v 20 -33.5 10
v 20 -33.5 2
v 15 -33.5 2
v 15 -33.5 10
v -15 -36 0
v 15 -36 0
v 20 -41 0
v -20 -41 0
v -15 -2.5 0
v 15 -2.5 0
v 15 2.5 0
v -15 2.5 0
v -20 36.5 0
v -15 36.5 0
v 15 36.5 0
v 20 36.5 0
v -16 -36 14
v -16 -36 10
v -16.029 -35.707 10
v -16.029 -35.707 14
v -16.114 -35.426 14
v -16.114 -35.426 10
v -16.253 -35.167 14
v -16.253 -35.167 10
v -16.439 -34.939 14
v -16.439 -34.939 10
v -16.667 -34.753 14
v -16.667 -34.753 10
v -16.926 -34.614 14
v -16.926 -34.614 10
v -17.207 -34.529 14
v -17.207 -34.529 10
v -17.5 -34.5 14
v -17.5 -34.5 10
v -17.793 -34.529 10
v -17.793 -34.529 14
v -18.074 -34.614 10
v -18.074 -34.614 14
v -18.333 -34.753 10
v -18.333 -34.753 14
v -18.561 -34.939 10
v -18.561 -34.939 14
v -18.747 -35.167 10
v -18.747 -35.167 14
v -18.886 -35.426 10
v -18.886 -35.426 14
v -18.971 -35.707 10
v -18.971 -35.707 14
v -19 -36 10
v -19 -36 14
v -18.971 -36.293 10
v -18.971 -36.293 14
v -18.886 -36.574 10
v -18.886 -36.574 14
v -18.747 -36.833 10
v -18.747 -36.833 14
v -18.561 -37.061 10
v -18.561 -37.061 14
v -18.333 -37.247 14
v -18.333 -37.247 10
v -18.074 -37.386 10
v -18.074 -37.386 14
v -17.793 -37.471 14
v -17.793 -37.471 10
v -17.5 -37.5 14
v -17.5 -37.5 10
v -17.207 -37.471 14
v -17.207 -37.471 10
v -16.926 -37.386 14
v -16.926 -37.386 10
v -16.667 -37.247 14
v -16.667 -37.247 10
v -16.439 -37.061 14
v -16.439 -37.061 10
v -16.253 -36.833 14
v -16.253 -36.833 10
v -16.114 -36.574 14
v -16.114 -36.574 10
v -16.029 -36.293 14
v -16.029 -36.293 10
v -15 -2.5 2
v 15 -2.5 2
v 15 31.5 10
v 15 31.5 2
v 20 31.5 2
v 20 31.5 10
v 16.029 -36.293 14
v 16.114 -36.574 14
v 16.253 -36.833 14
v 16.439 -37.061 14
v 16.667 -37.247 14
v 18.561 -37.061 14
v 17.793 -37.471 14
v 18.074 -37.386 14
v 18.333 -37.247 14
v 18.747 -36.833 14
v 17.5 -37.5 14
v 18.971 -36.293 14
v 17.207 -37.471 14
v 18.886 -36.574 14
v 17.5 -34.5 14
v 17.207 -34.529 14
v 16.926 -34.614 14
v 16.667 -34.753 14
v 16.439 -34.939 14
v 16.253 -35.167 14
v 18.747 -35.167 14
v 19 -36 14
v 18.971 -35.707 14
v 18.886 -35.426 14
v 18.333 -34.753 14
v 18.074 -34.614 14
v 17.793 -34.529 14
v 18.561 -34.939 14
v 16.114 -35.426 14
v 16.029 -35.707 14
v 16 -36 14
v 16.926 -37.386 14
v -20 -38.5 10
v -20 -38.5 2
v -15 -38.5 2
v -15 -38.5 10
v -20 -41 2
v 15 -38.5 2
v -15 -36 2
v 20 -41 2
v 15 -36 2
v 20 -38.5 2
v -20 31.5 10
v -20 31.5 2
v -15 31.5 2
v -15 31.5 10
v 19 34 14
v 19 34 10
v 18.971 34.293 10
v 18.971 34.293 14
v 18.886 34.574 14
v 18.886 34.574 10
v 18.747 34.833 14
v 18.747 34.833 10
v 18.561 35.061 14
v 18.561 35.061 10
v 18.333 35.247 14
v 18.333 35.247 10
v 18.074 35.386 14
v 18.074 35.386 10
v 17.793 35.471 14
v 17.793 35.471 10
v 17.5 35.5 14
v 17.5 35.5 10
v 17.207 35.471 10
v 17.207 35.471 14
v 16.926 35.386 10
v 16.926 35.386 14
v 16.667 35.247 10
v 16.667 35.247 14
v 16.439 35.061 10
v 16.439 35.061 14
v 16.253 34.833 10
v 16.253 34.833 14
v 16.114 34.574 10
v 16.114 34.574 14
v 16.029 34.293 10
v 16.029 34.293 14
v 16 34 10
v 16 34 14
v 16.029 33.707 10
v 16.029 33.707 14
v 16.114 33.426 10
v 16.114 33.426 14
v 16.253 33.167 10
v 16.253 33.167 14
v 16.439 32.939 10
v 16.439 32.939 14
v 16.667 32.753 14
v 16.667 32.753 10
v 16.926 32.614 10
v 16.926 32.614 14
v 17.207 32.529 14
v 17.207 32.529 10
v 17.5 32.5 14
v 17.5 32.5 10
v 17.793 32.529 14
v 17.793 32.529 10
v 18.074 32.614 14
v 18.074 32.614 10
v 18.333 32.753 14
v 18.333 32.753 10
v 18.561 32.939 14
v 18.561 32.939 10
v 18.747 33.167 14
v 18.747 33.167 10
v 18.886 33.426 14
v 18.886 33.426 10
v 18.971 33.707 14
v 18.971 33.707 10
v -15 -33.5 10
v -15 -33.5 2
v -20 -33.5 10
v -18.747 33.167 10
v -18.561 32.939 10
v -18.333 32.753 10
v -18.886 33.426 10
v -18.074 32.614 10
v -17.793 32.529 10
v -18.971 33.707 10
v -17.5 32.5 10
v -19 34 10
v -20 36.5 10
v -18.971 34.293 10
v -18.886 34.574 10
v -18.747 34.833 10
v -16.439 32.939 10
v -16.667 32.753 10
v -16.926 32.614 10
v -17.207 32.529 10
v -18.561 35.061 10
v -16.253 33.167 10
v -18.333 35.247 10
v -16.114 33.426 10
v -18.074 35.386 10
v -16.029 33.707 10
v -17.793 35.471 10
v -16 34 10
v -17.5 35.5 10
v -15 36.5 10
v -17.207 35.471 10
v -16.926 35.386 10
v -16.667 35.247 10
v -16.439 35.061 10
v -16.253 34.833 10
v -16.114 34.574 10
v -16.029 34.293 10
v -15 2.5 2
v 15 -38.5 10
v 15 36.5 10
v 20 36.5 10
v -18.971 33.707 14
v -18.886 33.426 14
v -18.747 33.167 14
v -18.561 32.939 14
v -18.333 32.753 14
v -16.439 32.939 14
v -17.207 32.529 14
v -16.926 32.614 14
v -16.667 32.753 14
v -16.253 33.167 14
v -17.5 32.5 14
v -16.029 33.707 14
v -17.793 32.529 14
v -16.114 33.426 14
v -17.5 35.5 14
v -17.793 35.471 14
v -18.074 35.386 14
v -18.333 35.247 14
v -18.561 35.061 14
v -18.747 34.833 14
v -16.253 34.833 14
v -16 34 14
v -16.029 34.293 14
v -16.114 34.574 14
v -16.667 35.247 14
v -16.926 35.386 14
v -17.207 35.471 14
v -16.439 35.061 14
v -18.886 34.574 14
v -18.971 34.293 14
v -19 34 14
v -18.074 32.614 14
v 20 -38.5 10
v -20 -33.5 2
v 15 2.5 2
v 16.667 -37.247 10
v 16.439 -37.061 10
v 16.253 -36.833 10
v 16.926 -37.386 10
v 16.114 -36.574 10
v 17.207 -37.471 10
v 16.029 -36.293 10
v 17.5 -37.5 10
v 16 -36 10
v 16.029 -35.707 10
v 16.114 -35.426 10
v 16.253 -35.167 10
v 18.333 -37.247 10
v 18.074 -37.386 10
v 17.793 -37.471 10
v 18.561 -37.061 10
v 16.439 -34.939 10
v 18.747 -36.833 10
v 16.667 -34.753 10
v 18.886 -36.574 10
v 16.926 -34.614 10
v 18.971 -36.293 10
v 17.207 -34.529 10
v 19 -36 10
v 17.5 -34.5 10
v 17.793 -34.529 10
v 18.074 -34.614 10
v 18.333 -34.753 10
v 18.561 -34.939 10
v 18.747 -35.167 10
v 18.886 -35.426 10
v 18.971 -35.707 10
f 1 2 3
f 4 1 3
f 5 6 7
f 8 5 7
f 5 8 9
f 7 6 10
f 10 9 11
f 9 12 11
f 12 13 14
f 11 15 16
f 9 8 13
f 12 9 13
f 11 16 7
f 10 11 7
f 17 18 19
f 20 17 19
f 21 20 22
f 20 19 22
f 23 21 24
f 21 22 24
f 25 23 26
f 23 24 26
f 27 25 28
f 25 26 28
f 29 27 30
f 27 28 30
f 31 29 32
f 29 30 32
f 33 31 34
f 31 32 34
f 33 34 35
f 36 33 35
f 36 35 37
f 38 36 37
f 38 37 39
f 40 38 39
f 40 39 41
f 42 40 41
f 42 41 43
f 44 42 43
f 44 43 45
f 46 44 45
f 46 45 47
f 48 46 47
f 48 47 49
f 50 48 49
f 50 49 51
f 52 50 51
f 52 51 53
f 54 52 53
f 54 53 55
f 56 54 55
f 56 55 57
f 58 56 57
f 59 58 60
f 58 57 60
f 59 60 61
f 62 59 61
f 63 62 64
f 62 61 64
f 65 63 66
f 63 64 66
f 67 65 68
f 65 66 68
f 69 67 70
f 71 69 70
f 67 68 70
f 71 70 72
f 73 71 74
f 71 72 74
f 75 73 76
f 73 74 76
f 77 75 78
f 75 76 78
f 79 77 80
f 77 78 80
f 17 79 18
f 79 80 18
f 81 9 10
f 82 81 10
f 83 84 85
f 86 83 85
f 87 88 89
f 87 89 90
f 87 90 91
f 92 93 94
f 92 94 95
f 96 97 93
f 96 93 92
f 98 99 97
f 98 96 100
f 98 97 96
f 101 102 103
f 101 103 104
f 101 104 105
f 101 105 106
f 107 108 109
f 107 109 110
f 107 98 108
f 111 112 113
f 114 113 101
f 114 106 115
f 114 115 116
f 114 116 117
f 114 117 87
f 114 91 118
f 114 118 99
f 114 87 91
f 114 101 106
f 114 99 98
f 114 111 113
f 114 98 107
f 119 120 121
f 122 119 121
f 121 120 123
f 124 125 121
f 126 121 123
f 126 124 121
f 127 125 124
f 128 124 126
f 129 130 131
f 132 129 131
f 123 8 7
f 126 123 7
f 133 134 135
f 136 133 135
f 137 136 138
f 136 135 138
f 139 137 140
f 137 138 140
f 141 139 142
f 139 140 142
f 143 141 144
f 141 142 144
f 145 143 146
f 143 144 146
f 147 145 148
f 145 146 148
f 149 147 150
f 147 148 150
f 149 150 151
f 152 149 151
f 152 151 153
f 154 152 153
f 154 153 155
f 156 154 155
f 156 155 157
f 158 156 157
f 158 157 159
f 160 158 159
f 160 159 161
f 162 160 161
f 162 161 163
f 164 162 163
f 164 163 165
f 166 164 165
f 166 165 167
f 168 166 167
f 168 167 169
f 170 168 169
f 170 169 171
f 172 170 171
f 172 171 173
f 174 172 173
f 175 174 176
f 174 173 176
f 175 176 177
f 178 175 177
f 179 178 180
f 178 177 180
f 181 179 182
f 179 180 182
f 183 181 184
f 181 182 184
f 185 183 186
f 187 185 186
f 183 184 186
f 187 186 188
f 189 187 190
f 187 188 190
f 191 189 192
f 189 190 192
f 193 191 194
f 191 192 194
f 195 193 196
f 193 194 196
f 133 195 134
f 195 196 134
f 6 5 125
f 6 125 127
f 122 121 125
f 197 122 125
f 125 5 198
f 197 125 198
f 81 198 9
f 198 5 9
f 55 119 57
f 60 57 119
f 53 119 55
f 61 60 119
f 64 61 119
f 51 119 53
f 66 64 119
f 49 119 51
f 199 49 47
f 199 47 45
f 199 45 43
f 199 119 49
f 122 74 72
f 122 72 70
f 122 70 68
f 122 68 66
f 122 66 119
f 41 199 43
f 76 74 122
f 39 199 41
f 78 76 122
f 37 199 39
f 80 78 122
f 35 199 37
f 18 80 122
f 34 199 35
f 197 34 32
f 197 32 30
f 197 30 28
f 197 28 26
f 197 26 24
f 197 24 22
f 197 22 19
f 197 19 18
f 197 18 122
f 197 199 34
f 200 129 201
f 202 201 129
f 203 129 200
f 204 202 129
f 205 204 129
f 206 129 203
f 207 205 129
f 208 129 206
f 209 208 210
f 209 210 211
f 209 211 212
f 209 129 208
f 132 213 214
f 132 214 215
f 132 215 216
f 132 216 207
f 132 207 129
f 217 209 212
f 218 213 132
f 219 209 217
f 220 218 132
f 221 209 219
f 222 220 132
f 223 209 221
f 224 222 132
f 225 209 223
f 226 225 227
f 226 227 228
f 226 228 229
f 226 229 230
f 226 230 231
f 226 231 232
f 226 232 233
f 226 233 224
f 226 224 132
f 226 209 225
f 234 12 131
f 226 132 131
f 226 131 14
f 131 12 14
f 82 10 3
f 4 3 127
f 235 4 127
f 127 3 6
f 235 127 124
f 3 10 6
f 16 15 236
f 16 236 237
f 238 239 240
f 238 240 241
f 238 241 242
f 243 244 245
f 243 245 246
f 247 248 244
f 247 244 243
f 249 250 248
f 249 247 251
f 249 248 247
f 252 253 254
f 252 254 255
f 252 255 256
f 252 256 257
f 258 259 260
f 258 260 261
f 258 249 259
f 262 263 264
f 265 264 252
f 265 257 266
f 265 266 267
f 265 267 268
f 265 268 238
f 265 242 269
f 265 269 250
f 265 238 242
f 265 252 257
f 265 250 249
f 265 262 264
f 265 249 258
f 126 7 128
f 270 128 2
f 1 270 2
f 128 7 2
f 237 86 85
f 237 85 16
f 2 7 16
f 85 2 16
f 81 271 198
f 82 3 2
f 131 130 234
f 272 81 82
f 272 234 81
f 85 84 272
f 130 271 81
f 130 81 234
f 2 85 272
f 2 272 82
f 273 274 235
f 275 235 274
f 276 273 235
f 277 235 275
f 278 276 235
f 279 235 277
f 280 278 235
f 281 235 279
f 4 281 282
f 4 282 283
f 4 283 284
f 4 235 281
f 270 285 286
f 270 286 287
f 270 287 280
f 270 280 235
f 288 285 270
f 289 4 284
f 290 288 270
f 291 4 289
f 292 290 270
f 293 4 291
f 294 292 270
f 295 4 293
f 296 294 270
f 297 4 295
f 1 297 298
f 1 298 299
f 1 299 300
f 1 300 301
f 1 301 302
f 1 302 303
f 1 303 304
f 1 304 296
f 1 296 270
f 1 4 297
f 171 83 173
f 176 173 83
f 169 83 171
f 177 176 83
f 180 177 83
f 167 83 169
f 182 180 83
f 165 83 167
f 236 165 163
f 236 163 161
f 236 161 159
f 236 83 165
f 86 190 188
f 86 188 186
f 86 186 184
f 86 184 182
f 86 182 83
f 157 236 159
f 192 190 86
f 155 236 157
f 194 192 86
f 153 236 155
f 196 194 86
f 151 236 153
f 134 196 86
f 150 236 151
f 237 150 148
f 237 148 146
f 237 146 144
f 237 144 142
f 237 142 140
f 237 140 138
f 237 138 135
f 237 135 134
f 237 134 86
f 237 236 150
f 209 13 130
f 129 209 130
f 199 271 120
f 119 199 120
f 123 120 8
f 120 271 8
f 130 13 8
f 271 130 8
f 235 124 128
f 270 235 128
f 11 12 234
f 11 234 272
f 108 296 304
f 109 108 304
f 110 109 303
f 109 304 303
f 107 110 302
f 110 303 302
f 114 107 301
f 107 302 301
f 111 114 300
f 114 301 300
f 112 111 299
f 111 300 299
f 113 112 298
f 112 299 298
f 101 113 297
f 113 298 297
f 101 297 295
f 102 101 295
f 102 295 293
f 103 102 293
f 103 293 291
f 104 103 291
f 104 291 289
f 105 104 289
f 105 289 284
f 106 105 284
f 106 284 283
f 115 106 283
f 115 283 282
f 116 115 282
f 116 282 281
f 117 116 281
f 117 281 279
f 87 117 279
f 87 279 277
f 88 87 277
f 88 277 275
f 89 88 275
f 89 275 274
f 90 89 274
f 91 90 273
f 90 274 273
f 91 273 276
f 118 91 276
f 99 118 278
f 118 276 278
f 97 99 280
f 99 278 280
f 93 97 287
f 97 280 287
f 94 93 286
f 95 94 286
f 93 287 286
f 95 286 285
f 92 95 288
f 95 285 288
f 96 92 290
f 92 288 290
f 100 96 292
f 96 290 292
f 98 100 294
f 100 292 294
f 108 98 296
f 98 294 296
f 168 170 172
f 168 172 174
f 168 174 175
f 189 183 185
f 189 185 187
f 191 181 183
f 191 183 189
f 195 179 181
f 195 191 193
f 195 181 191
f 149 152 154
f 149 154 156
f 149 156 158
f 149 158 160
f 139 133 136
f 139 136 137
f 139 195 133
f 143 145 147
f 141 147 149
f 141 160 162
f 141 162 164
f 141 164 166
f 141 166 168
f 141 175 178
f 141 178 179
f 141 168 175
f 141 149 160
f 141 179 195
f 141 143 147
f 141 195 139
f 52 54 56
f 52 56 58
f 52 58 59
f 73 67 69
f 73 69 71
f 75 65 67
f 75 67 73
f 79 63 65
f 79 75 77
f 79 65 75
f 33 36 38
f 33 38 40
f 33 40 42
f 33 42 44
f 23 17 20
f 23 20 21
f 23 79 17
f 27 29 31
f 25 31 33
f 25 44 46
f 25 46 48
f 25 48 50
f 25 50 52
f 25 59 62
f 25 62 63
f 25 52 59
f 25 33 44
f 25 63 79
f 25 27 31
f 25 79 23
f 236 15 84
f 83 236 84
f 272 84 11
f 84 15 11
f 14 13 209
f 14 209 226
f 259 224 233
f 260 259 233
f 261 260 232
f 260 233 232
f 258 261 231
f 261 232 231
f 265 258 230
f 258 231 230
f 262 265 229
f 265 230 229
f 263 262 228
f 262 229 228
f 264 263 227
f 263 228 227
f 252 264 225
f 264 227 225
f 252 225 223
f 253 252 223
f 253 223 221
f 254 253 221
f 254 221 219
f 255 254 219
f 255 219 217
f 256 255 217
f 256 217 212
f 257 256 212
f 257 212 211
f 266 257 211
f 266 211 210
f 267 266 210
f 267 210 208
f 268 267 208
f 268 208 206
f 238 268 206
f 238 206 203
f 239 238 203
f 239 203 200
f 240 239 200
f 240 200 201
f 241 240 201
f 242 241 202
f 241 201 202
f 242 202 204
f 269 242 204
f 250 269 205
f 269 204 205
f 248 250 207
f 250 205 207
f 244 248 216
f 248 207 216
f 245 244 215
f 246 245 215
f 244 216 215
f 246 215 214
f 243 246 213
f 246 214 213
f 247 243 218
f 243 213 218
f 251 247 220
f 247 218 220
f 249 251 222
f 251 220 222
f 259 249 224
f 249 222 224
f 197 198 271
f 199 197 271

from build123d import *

# Parameters (mm, degrees)
F0_W     = 5
F0_H     = 29
F0_H_2   = 31
F0_H_3   = 5
F0_R     = 1.5
F0_W_2   = 30
F0_H_4   = 2.5
F1_DEPTH = 2
F2_DEPTH = 10
F3_DEPTH = 14


with BuildPart() as f1:
    # F0 (on Top) → F1 (new body)
    with BuildSketch(Plane.XY):
        Polygon((-20, -41), (20, -41), (20, -38.5), (15, -38.5), (-15, -38.5), (-20, -38.5), align=None)
        with Locations((-17.5, 17)):
            Rectangle(F0_W, F0_H)
        with Locations((-17.5, -18)):
            Rectangle(F0_W, F0_H_2)
        with Locations((-17.5, 0)):
            Rectangle(F0_W, F0_H_3)
        with Locations((17.5, 17)):
            Rectangle(F0_W, F0_H)
        with Locations((17.5, -18)):
            Rectangle(F0_W, F0_H_2)
        with Locations((17.5, 0)):
            Rectangle(F0_W, F0_H_3)
        with Locations((-17.5, 34)):
            Rectangle(F0_W, F0_H_3)
        with Locations((-17.5, 34)):
            Circle(F0_R, mode=Mode.SUBTRACT)
        with Locations((17.5, 34)):
            Rectangle(F0_W, F0_H_3)
        with Locations((17.5, 34)):
            Circle(F0_R, mode=Mode.SUBTRACT)
        Polygon((15, -38.5), (20, -38.5), (20, -33.5), (15, -33.5), (15, -36), align=None)
        with Locations((17.5, -36)):
            Circle(F0_R, mode=Mode.SUBTRACT)
        Polygon((-20, -33.5), (-20, -38.5), (-15, -38.5), (-15, -36), (-15, -33.5), align=None)
        with Locations((-17.5, -36)):
            Circle(F0_R, mode=Mode.SUBTRACT)
        with Locations((-17.5, 34)):
            Circle(F0_R)
        with Locations((17.5, 34)):
            Circle(F0_R)
        Rectangle(F0_W_2, F0_H_3)
        with Locations((-17.5, -36)):
            Circle(F0_R)
        with Locations((17.5, -36)):
            Circle(F0_R)
        with Locations((0, -37.25)):
            Rectangle(F0_W_2, F0_H_4)
    extrude(amount=F1_DEPTH)

    # F0 (on Top) → F2 (join)
    with BuildSketch(Plane.XY):
        with Locations((17.5, 34)):
            Rectangle(F0_W, F0_H_3)
        with Locations((17.5, 34)):
            Circle(F0_R, mode=Mode.SUBTRACT)
        with Locations((17.5, 34)):
            Circle(F0_R)
        with Locations((-17.5, 34)):
            Rectangle(F0_W, F0_H_3)
        with Locations((-17.5, 34)):
            Circle(F0_R, mode=Mode.SUBTRACT)
        with Locations((-17.5, 34)):
            Circle(F0_R)
        Polygon((15, -38.5), (20, -38.5), (20, -33.5), (15, -33.5), (15, -36), align=None)
        with Locations((17.5, -36)):
            Circle(F0_R, mode=Mode.SUBTRACT)
        with Locations((17.5, -36)):
            Circle(F0_R)
        Polygon((-20, -33.5), (-20, -38.5), (-15, -38.5), (-15, -36), (-15, -33.5), align=None)
        with Locations((-17.5, -36)):
            Circle(F0_R, mode=Mode.SUBTRACT)
        with Locations((-17.5, -36)):
            Circle(F0_R)
    extrude(amount=F2_DEPTH)

    # F0 (on Top) → F3 (join)
    with BuildSketch(Plane.XY):
        with Locations((17.5, 34)):
            Circle(F0_R)
        with Locations((-17.5, 34)):
            Circle(F0_R)
        with Locations((17.5, -36)):
            Circle(F0_R)
        with Locations((-17.5, -36)):
            Circle(F0_R)
    extrude(amount=F3_DEPTH)


solid = f1.part
